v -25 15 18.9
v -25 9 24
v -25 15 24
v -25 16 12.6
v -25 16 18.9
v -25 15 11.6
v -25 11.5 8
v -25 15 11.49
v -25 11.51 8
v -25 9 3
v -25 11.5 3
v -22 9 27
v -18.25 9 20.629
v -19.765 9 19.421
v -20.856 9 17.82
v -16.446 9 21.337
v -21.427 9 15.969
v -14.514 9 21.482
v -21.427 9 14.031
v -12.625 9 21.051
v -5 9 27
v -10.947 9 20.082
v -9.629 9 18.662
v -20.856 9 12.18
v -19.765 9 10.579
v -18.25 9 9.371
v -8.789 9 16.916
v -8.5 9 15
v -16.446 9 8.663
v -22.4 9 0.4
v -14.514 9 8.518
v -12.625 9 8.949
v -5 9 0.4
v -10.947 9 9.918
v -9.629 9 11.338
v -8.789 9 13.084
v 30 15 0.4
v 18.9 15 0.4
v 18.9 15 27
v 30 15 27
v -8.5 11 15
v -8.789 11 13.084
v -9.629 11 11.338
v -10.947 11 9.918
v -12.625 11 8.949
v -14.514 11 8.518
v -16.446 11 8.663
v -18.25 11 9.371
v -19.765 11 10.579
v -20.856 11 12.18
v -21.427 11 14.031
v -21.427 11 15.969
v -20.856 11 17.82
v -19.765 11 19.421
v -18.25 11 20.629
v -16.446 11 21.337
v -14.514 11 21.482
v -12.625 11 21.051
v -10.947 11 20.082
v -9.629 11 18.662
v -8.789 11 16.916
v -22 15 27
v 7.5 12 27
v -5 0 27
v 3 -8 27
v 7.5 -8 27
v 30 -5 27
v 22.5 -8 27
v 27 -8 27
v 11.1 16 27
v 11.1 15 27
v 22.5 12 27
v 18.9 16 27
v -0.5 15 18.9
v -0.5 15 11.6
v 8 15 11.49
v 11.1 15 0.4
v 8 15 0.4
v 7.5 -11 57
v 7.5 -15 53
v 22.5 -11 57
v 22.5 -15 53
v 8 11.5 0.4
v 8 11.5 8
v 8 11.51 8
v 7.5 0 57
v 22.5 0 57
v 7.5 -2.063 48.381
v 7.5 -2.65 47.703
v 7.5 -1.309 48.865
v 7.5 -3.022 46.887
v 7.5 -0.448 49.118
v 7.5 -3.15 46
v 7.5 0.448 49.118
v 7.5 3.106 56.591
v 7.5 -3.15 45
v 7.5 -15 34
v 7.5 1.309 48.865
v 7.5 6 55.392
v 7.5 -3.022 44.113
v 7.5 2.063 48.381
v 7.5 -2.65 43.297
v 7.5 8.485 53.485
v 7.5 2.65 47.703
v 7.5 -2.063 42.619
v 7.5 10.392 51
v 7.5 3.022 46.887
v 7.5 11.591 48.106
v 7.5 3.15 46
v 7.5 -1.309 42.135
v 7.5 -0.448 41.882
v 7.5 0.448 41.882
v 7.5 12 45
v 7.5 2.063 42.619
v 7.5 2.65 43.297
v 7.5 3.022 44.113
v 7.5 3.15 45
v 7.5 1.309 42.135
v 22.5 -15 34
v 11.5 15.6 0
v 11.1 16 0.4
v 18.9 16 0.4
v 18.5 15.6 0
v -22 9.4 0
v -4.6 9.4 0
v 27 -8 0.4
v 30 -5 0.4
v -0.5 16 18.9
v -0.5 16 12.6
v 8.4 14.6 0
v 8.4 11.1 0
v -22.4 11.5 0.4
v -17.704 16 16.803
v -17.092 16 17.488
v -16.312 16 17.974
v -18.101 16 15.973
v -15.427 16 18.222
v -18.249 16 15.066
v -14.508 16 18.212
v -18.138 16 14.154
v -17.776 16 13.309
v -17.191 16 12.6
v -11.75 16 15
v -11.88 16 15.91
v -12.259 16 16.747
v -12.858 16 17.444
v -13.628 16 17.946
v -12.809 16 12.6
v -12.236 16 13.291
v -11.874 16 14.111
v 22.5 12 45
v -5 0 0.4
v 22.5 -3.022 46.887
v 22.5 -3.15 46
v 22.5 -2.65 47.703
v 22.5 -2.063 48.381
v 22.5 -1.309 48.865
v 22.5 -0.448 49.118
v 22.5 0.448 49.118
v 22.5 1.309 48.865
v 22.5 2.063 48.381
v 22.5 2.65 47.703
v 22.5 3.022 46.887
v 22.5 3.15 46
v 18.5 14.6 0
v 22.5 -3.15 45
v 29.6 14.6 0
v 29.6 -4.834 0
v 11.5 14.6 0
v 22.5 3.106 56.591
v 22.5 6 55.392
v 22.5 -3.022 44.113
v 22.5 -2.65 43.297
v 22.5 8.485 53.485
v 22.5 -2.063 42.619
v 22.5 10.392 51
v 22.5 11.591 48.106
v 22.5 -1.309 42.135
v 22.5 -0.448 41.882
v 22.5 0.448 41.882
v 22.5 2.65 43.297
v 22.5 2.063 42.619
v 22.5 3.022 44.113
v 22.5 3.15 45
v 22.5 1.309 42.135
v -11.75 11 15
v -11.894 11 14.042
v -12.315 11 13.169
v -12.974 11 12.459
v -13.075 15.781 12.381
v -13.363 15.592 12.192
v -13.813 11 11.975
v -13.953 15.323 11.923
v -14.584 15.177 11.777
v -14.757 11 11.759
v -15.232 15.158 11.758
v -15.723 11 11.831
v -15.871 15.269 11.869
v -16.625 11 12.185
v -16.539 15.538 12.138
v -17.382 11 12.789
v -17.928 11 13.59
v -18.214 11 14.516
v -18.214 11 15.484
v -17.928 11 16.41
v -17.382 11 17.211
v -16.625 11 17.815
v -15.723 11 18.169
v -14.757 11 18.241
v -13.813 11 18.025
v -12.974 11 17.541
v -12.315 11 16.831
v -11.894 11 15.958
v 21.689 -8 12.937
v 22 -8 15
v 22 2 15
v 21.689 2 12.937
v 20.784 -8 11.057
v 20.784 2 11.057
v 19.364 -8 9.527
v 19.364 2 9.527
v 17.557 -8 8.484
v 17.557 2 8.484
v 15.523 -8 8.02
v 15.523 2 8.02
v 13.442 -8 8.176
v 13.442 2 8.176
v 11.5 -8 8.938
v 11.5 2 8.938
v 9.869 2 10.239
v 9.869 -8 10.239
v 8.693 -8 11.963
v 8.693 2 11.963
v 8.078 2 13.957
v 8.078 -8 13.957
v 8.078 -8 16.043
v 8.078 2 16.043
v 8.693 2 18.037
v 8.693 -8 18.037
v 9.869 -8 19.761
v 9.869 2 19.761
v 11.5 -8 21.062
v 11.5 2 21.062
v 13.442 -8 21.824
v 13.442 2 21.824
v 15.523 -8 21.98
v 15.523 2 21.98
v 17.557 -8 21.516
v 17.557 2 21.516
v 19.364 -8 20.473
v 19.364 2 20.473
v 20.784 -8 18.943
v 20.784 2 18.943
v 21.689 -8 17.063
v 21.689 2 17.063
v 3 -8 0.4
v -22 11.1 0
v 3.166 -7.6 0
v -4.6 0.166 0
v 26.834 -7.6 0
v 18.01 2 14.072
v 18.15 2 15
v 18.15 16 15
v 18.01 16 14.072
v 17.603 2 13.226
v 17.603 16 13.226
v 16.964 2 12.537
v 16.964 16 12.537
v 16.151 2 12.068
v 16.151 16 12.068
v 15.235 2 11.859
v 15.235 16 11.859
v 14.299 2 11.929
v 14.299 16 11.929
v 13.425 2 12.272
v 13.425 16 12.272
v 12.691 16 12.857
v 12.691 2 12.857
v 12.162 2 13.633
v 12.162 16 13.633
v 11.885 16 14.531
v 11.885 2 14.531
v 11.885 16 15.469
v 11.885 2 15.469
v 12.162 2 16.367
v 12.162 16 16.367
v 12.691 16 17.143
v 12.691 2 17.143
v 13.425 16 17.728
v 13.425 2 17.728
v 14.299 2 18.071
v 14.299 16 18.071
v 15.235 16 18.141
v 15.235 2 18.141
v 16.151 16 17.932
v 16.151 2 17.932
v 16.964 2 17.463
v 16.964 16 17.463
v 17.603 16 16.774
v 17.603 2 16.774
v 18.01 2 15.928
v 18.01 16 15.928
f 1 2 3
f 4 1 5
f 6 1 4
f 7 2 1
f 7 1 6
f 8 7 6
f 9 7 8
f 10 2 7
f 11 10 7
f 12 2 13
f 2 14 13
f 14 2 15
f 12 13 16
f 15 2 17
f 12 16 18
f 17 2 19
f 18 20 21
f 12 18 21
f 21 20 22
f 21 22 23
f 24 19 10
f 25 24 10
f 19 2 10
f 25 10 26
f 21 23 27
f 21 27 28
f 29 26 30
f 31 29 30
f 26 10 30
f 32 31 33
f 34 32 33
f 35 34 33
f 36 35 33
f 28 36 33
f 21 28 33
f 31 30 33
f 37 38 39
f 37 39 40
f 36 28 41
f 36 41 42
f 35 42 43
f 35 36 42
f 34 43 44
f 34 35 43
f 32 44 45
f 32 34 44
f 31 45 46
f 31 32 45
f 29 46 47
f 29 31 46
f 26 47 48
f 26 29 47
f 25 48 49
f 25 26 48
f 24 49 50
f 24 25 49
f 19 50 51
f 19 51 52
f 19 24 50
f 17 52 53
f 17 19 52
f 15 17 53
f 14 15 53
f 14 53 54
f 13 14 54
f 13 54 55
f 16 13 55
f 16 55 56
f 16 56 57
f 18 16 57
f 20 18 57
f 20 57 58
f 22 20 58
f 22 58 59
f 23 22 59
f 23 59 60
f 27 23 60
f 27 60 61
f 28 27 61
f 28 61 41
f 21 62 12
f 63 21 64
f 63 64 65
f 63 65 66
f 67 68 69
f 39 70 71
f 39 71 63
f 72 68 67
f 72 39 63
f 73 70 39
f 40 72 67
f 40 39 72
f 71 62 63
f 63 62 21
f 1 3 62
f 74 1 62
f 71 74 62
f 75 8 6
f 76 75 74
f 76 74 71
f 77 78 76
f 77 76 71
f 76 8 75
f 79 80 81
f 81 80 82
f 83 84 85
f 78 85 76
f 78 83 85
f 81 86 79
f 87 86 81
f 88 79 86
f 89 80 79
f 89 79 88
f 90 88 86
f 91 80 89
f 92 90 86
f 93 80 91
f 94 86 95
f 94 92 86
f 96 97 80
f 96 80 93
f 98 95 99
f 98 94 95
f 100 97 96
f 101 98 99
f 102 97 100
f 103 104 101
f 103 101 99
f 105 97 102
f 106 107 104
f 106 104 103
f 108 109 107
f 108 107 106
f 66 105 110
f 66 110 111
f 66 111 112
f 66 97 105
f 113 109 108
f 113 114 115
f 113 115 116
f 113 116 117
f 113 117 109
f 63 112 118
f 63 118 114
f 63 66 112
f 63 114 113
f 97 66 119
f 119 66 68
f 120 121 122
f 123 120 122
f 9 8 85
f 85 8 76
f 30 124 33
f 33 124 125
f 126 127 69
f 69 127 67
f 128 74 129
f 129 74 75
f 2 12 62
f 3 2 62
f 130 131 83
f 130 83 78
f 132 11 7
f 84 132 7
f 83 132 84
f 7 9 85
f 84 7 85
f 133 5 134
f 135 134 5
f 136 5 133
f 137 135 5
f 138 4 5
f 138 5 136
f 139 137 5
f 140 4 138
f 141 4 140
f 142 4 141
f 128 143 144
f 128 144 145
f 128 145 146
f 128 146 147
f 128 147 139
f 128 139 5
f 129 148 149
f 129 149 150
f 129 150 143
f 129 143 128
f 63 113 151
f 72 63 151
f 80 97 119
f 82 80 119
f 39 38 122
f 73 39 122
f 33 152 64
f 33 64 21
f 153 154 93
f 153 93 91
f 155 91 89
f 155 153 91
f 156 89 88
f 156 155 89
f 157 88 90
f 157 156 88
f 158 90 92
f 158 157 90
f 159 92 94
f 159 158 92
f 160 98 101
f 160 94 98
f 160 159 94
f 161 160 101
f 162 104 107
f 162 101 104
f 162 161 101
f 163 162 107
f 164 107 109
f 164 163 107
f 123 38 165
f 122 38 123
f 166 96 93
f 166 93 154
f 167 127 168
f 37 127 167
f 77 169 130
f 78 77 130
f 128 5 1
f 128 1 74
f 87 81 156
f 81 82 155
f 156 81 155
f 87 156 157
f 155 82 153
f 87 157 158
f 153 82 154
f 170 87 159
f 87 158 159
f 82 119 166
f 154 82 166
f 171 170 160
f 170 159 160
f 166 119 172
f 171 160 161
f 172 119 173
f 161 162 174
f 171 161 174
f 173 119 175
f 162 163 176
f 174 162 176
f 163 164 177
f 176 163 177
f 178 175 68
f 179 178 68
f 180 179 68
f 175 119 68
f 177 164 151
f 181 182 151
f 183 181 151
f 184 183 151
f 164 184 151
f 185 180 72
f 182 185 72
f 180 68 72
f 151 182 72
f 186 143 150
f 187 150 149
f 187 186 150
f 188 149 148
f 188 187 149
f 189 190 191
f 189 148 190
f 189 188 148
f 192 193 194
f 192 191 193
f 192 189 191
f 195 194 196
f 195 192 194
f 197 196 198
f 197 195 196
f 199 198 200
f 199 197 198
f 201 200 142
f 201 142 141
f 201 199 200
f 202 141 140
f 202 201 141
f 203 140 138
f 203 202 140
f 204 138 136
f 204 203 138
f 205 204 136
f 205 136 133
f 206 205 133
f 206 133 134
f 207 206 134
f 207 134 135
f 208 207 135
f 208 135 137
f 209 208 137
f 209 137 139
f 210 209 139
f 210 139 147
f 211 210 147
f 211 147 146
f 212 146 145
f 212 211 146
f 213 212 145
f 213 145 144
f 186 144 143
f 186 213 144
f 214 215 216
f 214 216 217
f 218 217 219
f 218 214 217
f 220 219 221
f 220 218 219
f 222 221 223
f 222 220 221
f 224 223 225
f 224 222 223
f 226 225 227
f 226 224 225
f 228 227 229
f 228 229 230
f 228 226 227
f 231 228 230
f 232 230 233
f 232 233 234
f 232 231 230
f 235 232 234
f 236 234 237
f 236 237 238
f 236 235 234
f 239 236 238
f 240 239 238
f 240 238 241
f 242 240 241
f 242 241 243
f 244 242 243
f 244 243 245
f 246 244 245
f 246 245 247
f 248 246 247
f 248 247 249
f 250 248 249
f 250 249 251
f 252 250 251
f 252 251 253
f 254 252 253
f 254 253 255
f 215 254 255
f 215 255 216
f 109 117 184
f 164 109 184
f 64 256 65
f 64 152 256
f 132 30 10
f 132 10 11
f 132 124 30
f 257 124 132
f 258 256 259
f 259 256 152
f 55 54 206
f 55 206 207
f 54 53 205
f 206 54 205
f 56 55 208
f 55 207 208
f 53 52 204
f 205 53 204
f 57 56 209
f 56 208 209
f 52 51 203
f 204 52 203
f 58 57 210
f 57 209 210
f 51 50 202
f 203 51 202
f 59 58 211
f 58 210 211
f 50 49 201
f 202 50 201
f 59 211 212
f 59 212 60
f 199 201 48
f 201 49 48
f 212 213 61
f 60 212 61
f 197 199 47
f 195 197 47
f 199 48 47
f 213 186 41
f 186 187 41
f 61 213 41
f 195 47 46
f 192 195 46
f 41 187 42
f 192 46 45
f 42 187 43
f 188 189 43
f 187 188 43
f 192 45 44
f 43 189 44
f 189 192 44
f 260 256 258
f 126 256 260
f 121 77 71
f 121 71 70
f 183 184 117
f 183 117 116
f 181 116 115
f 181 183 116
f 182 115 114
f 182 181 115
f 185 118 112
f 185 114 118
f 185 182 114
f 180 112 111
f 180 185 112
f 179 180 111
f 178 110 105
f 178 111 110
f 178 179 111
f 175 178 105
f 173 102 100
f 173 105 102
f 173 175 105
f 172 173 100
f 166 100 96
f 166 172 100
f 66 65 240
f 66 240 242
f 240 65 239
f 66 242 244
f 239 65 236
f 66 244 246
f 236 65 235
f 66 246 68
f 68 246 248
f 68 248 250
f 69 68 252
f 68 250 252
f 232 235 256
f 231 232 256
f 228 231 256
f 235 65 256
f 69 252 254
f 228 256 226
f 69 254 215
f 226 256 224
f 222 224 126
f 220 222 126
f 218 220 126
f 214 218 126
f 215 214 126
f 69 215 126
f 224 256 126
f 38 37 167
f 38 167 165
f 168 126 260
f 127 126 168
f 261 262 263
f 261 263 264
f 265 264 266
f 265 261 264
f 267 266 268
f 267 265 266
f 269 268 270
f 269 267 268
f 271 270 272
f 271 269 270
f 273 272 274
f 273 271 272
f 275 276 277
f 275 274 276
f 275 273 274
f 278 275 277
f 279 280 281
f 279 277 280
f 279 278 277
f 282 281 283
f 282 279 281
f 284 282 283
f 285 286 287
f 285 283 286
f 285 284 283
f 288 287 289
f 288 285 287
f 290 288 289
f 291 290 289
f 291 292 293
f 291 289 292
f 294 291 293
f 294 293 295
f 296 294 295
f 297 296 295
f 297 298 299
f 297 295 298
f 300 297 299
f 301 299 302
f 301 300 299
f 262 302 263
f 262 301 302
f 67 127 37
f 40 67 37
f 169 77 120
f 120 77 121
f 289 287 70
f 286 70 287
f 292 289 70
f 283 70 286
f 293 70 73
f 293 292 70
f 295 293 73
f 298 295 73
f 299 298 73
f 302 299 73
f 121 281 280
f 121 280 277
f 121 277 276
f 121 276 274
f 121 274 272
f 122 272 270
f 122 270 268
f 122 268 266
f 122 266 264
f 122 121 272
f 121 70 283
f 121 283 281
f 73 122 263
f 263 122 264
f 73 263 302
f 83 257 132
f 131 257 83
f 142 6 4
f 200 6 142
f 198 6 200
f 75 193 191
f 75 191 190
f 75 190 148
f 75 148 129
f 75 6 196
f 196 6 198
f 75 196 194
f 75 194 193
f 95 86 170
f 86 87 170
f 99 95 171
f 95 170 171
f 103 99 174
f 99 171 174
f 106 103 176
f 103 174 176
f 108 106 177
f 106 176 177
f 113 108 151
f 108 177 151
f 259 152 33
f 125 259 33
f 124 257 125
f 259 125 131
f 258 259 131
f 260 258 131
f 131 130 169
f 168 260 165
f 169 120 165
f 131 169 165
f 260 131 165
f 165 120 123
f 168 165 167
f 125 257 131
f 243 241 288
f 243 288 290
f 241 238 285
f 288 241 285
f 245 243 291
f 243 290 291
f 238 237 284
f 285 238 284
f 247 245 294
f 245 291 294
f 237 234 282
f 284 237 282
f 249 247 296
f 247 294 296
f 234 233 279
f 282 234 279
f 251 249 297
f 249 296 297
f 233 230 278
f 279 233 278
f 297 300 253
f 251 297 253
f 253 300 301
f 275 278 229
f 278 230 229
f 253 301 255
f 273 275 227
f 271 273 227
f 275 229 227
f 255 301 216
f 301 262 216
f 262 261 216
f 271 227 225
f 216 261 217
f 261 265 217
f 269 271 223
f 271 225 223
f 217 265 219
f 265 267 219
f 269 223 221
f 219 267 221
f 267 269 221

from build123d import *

# Parameters (mm, degrees)
CYLINDER007_R         = 3.15
CYLINDER007_DEPTH     = 20
CYLINDER006_R         = 3.15
CYLINDER006_DEPTH     = 20
BOX010_W              = 20
BOX010_H              = 6.3
BOX010_DEPTH          = 1
BOX006_W              = 15
BOX006_H              = 27
BOX006_DEPTH          = 30
CHAMFER002001002_SIZE = 7
FILLET_R              = 12
CHAMFER002001003_SIZE = 4
CYLINDER009_R         = 6.5
CYLINDER009_DEPTH     = 19
CYLINDER008_R         = 3.25
CYLINDER008_DEPTH     = 19
CYLINDER004_R         = 3.15
CYLINDER004_DEPTH     = 36
CYLINDER005_R         = 7
CYLINDER005_DEPTH     = 36
BOX008_W              = 7.8
BOX008_H              = 1
BOX008_DEPTH          = 27
BOX009_W              = 24.5
BOX009_H              = 2
BOX009_DEPTH          = 7.3
CHAMFER002001008_SIZE = 1
BOX011_W              = 33
BOX011_H              = 3.5
BOX011_DEPTH          = 8
BOX012_W              = 20
BOX012_H              = 6
BOX012_DEPTH          = 27
CHAMFER002001007_SIZE = 3
BOX007_W              = 35
BOX007_H              = 23
BOX007_DEPTH          = 27
CHAMFER002001005_SIZE = 3
CHAMFER002001006_SIZE = 8
CHAMFER002001009_SIZE = 3.49
CHAMFER002001010_SIZE = 0.4


with BuildPart() as cylinder007:
    # Cylinder007 → Cylinder007 (new body)
    with BuildSketch(Plane(origin=(0, 0, 1), x_dir=(0, 0, 1), z_dir=(-1, 0, 0))):
        Circle(CYLINDER007_R)
    extrude(amount=CYLINDER007_DEPTH)


with BuildPart() as cylinder006:
    # Cylinder006 → Cylinder006 (new body)
    with BuildSketch(Plane.ZY):
        Circle(CYLINDER006_R)
    extrude(amount=CYLINDER006_DEPTH)


with BuildPart() as fusion003004:
    # Box010 → Box010 (new body)
    with BuildSketch(Plane(origin=(-20, -3.15, 0), x_dir=(1, 0, 0), z_dir=(0, 0, 1))):
        with Locations((10, 3.15)):
            Rectangle(BOX010_W, BOX010_H)
    extrude(amount=BOX010_DEPTH)

    # Fusion003004: union Cylinder007, Cylinder006
    add(cylinder007.part)
    add(cylinder006.part)


with BuildPart() as fusion003004_1:
    # Fusion003004 placement: moved
    add(fusion003004.part.moved(Location((25, 0, 45))))


with BuildPart() as cut004:
    # Box006 → Box006 (new body)
    with BuildSketch(Plane(origin=(7.5, -15, 27), x_dir=(1, 0, 0), z_dir=(0, 0, 1))):
        with Locations((7.5, 13.5)):
            Rectangle(BOX006_W, BOX006_H)
    extrude(amount=BOX006_DEPTH)

    # Chamfer002001002
    chamfer002001002_edges = [cut004.edges().sort_by_distance(p)[0] for p in [
        (15, -15, 27),
    ]]
    chamfer(chamfer002001002_edges, length=CHAMFER002001002_SIZE)

    # Fillet
    fillet_edges = [cut004.edges().sort_by_distance(p)[0] for p in [
        (15, 12, 57),
    ]]
    fillet(fillet_edges, radius=FILLET_R)

    # Chamfer002001003
    chamfer002001003_edges = [cut004.edges().sort_by_distance(p)[0] for p in [
        (15, -15, 57),
    ]]
    chamfer(chamfer002001003_edges, length=CHAMFER002001003_SIZE)

    # Cut004: cut Fusion003004
    add(fusion003004_1.part, mode=Mode.SUBTRACT)


with BuildPart() as cylinder009:
    # Cylinder009 → Cylinder009 (new body)
    with BuildSketch(Plane(origin=(-15, -8, 15), x_dir=(1, 0, 0), z_dir=(0, 1, 0))):
        Circle(CYLINDER009_R)
    extrude(amount=CYLINDER009_DEPTH)


with BuildPart() as cylinder008:
    # Cylinder008 → Cylinder008 (new body)
    with BuildSketch(Plane(origin=(-15, 0, 15), x_dir=(1, 0, 0), z_dir=(0, 1, 0))):
        Circle(CYLINDER008_R)
    extrude(amount=CYLINDER008_DEPTH)


with BuildPart() as cylinder004:
    # Cylinder004 → Cylinder004 (new body)
    with BuildSketch(Plane(origin=(15, -15, 15), x_dir=(1, 0, 0), z_dir=(0, 1, 0))):
        Circle(CYLINDER004_R)
    extrude(amount=CYLINDER004_DEPTH)


with BuildPart() as fusion003008:
    # Cylinder005 → Cylinder005 (new body)
    with BuildSketch(Plane(origin=(15, -34, 15), x_dir=(1, 0, 0), z_dir=(0, 1, 0))):
        Circle(CYLINDER005_R)
    extrude(amount=CYLINDER005_DEPTH)

    # Fusion003008: union Cylinder004
    add(cylinder004.part)


with BuildPart() as cube008:
    # Box008 → Box008 (new body)
    with BuildSketch(Plane(origin=(11.1, 15, 0), x_dir=(1, 0, 0), z_dir=(0, 0, 1))):
        with Locations((3.9, 0.5)):
            Rectangle(BOX008_W, BOX008_H)
    extrude(amount=BOX008_DEPTH)


with BuildPart() as fusion003010:
    # Box009 → Box009 (new body)
    with BuildSketch(Plane(origin=(-25, 14, 11.6), x_dir=(1, 0, 0), z_dir=(0, 0, 1))):
        with Locations((12.25, 1)):
            Rectangle(BOX009_W, BOX009_H)
    extrude(amount=BOX009_DEPTH)

    # Chamfer002001008
    chamfer002001008_edges = [fusion003010.edges().sort_by_distance(p)[0] for p in [
        (-12.75, 16, 11.6),
    ]]
    chamfer(chamfer002001008_edges, length=CHAMFER002001008_SIZE)

    # Fusion003010: union Cube008
    add(cube008.part)


with BuildPart() as cube011:
    # Box011 → Box011 (new body)
    with BuildSketch(Plane(origin=(-25, 11.5, 0), x_dir=(1, 0, 0), z_dir=(0, 0, 1))):
        with Locations((16.5, 1.75)):
            Rectangle(BOX011_W, BOX011_H)
    extrude(amount=BOX011_DEPTH)


with BuildPart() as chamfer002001007:
    # Box012 → Box012 (new body)
    with BuildSketch(Plane(origin=(-25, 9, 0), x_dir=(1, 0, 0), z_dir=(0, 0, 1))):
        with Locations((10, 3)):
            Rectangle(BOX012_W, BOX012_H)
    extrude(amount=BOX012_DEPTH)

    # Chamfer002001007
    chamfer002001007_edges = [chamfer002001007.edges().sort_by_distance(p)[0] for p in [
        (-25, 12, 27),
        (-25, 12, 0),
    ]]
    chamfer(chamfer002001007_edges, length=CHAMFER002001007_SIZE)


with BuildPart() as chamfer002001010:
    # Box007 → Box007 (new body)
    with BuildSketch(Plane(origin=(-5, -8, 0), x_dir=(1, 0, 0), z_dir=(0, 0, 1))):
        with Locations((17.5, 11.5)):
            Rectangle(BOX007_W, BOX007_H)
    extrude(amount=BOX007_DEPTH)

    # Chamfer002001005
    chamfer002001005_edges = [chamfer002001010.edges().sort_by_distance(p)[0] for p in [
        (30, -8, 13.5),
    ]]
    chamfer(chamfer002001005_edges, length=CHAMFER002001005_SIZE)

    # Chamfer002001006
    chamfer002001006_edges = [chamfer002001010.edges().sort_by_distance(p)[0] for p in [
        (-5, -8, 13.5),
    ]]
    chamfer(chamfer002001006_edges, length=CHAMFER002001006_SIZE)

    # Fusion003009: union Chamfer002001007
    add(chamfer002001007.part)

    # Cut005: cut Cube011
    add(cube011.part, mode=Mode.SUBTRACT)

    # Chamfer002001009
    chamfer002001009_edges = [chamfer002001010.edges().sort_by_distance(p)[0] for p in [
        (1.5, 15, 8),
    ]]
    chamfer(chamfer002001009_edges, length=CHAMFER002001009_SIZE)

    # Fusion003011: union Fusion003010
    add(fusion003010.part)

    # Cut006: cut Fusion003008
    add(fusion003008.part, mode=Mode.SUBTRACT)

    # Cut007: cut Cylinder008
    add(cylinder008.part, mode=Mode.SUBTRACT)

    # Cut008: cut Cylinder009
    add(cylinder009.part, mode=Mode.SUBTRACT)

    # Fusion003012: union Cut004
    add(cut004.part)

    # Chamfer002001010
    chamfer002001010_edges = [chamfer002001010.edges().sort_by_distance(p)[0] for p in [
        (8, 13.25, 0),
        (-7, 11.5, 0),
        (-13.5, 9, 0),
        (24.45, 15, 0),
        (30, 5, 0),
        (28.5, -6.5, 0),
        (15, -8, 0),
        (-1, -4, 0),
        (-5, 4.5, 0),
        (18.9, 15.5, 0),
        (11.1, 15.5, 0),
        (15, 16, 0),
        (9.55, 15, 0),
    ]]
    chamfer(chamfer002001010_edges, length=CHAMFER002001010_SIZE)


solid = chamfer002001010.part
